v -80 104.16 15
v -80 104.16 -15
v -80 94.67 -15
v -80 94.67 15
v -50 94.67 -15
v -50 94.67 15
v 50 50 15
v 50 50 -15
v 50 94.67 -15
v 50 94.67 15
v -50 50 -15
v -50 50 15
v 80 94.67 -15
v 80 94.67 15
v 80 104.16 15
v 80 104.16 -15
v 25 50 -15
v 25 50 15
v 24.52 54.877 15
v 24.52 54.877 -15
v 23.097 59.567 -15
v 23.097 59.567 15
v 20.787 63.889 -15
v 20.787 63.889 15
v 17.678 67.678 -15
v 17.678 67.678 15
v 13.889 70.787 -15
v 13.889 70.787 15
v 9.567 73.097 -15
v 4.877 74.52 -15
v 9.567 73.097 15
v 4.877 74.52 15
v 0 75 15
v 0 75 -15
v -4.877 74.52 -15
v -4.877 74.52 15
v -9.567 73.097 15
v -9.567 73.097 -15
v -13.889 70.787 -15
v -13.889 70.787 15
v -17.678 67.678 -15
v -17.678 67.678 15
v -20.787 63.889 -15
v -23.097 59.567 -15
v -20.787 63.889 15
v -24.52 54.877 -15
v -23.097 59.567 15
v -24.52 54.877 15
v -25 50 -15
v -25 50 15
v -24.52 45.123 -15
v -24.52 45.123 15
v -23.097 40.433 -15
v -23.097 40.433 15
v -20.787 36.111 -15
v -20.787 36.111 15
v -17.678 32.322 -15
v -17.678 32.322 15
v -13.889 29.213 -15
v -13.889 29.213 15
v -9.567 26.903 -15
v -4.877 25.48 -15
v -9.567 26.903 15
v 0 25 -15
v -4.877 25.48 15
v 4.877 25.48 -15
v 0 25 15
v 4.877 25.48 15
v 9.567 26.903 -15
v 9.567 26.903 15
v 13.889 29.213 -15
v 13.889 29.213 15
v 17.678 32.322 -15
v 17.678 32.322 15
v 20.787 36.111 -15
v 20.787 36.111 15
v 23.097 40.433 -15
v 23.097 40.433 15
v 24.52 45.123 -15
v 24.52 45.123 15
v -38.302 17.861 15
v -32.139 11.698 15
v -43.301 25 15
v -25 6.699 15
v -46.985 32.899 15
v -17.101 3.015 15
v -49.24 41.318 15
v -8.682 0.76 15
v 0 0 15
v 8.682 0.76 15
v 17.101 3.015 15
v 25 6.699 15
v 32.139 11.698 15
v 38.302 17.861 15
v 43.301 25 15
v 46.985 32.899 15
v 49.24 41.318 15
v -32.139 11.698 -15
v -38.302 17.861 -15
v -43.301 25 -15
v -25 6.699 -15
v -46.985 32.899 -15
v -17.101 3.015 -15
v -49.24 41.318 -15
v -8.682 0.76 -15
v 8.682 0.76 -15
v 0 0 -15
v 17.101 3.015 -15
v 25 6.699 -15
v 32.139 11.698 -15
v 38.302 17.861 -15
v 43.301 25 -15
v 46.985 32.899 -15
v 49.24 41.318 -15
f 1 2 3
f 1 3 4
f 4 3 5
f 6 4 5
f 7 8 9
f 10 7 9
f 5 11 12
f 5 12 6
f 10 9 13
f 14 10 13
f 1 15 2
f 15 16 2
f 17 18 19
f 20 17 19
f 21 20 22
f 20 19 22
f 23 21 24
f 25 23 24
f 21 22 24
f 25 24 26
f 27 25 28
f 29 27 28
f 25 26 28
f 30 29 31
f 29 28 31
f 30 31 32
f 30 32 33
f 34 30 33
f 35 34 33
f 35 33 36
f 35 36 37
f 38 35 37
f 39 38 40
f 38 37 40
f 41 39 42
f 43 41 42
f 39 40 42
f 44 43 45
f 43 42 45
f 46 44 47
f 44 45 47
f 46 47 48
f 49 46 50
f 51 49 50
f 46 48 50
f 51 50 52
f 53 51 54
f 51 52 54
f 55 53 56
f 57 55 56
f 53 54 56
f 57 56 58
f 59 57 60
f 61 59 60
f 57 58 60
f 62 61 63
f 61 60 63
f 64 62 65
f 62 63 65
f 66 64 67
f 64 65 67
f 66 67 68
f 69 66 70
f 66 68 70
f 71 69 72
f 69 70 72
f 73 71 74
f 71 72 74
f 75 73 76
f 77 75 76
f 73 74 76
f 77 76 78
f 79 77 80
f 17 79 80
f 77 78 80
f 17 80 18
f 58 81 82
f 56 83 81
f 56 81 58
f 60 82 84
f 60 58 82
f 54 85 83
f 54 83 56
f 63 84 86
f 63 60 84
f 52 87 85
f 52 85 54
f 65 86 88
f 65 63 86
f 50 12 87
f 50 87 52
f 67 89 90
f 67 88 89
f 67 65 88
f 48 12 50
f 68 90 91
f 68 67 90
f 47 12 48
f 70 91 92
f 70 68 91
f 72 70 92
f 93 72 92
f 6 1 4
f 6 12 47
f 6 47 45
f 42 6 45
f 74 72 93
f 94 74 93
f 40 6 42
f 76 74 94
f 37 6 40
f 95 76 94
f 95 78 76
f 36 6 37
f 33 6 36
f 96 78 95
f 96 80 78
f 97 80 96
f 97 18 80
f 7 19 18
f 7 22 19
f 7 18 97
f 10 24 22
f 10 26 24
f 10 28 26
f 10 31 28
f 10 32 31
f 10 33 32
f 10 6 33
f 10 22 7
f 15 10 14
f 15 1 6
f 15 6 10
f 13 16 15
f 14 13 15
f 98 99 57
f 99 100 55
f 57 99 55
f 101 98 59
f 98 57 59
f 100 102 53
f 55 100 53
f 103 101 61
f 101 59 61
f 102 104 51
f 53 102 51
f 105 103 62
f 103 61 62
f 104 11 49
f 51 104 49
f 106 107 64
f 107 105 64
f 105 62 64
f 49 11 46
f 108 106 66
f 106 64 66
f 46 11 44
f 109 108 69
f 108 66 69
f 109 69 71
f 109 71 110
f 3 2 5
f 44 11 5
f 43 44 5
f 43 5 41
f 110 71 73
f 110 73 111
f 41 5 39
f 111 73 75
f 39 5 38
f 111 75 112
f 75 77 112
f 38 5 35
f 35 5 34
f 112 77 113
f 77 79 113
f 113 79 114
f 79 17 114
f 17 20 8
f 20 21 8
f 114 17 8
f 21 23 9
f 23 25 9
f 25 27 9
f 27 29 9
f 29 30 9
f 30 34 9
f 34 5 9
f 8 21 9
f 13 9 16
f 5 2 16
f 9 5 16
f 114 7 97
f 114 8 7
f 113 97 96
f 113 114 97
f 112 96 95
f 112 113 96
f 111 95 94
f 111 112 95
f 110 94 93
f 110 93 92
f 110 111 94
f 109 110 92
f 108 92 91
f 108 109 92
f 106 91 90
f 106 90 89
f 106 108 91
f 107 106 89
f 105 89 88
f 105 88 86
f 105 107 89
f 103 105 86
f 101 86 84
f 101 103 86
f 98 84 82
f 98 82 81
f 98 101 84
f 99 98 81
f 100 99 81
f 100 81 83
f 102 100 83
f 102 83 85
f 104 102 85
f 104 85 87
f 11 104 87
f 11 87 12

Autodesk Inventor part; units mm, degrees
ref_plane "YZ Plane" through (0, 0, 0) normal (1, 0, 0) x (0, 1, 0)
ref_plane "XZ Plane" through (0, 0, 0) normal (0, 1, 0) x (-1, 0, 0)
ref_plane "XY Plane" through (0, 0, 0) normal (0, 0, 1) x (1, 0, 0)
sketch "Sketch1" plane through (0, 0, 0) normal (0, 0, 1) x (1, 0, 0)
  arc A0 (-50, 50) -> (0, 0) centre (0, 50) ccw
  line L0 (0, 0) -> (0, 52.848) construction
  line L1 (0, 0) -> (-10.7104, 0) construction
  arc A1 (0, 0) -> (50, 50) centre (0, 50) ccw
  circle A2 centre (0, 50) radius 25
  arc A3 (0, 25) -> (25, 50) centre (0, 50) ccw
  line L2 (-50, 50) -> (-50, 85)
  line L3 (50, 50) -> (50, 85)
  line L4 (50, 85) -> (-50, 85)
  dimension "d0" = 50
  dimension "d1" = 25
  dimension "d15" = 85
extrude "Extrusion1" add sketch "Sketch1" along normal mid plane 30
sketch "Sketch5" plane through (-50, 85, 15) normal (0, 1, 0) x (1, 0, 0)
  line L0 (100, 30) -> (100, 0) projected
  line L1 (100, 30) -> (130, 30)
  line L2 (130, 30) -> (130, 0)
  line L3 (130, 0) -> (100, 0)
  line L4 (100, 0) -> (100, 30)
  line L5 (0, 30) -> (0, 0) projected
  line L6 (0, 30) -> (-30, 30)
  line L7 (-30, 30) -> (-30, 0)
  line L8 (-30, 0) -> (0, 0)
  line L9 (0, 0) -> (0, 30)
  point P0 (50, 15)
  dimension "d16" = 30
  dimension "d17" = 30
  dimension "d18" = 30
  dimension "d19" = 30
extrude "Extrusion4" add sketch "Sketch5" against normal blind 6
move faces "Move1" translate (0, 25.99, 0) faces at (-26.6667, 85, -5)
move faces "Move2" translate (0, 22.5, 0) faces at (-70, 79, -5) (60, 79, -5)
move faces "Move3" translate (0, -6.83, 0) faces at (1.0045, 92.6059, 15) (1.0045, 92.6059, -15) (26.6667, 110.99, 5) (-80, 107.8267, -5) (80, 107.8267, 5) (60, 101.5, -5) (-70, 101.5, -5)
properties part number "wheel holder"
